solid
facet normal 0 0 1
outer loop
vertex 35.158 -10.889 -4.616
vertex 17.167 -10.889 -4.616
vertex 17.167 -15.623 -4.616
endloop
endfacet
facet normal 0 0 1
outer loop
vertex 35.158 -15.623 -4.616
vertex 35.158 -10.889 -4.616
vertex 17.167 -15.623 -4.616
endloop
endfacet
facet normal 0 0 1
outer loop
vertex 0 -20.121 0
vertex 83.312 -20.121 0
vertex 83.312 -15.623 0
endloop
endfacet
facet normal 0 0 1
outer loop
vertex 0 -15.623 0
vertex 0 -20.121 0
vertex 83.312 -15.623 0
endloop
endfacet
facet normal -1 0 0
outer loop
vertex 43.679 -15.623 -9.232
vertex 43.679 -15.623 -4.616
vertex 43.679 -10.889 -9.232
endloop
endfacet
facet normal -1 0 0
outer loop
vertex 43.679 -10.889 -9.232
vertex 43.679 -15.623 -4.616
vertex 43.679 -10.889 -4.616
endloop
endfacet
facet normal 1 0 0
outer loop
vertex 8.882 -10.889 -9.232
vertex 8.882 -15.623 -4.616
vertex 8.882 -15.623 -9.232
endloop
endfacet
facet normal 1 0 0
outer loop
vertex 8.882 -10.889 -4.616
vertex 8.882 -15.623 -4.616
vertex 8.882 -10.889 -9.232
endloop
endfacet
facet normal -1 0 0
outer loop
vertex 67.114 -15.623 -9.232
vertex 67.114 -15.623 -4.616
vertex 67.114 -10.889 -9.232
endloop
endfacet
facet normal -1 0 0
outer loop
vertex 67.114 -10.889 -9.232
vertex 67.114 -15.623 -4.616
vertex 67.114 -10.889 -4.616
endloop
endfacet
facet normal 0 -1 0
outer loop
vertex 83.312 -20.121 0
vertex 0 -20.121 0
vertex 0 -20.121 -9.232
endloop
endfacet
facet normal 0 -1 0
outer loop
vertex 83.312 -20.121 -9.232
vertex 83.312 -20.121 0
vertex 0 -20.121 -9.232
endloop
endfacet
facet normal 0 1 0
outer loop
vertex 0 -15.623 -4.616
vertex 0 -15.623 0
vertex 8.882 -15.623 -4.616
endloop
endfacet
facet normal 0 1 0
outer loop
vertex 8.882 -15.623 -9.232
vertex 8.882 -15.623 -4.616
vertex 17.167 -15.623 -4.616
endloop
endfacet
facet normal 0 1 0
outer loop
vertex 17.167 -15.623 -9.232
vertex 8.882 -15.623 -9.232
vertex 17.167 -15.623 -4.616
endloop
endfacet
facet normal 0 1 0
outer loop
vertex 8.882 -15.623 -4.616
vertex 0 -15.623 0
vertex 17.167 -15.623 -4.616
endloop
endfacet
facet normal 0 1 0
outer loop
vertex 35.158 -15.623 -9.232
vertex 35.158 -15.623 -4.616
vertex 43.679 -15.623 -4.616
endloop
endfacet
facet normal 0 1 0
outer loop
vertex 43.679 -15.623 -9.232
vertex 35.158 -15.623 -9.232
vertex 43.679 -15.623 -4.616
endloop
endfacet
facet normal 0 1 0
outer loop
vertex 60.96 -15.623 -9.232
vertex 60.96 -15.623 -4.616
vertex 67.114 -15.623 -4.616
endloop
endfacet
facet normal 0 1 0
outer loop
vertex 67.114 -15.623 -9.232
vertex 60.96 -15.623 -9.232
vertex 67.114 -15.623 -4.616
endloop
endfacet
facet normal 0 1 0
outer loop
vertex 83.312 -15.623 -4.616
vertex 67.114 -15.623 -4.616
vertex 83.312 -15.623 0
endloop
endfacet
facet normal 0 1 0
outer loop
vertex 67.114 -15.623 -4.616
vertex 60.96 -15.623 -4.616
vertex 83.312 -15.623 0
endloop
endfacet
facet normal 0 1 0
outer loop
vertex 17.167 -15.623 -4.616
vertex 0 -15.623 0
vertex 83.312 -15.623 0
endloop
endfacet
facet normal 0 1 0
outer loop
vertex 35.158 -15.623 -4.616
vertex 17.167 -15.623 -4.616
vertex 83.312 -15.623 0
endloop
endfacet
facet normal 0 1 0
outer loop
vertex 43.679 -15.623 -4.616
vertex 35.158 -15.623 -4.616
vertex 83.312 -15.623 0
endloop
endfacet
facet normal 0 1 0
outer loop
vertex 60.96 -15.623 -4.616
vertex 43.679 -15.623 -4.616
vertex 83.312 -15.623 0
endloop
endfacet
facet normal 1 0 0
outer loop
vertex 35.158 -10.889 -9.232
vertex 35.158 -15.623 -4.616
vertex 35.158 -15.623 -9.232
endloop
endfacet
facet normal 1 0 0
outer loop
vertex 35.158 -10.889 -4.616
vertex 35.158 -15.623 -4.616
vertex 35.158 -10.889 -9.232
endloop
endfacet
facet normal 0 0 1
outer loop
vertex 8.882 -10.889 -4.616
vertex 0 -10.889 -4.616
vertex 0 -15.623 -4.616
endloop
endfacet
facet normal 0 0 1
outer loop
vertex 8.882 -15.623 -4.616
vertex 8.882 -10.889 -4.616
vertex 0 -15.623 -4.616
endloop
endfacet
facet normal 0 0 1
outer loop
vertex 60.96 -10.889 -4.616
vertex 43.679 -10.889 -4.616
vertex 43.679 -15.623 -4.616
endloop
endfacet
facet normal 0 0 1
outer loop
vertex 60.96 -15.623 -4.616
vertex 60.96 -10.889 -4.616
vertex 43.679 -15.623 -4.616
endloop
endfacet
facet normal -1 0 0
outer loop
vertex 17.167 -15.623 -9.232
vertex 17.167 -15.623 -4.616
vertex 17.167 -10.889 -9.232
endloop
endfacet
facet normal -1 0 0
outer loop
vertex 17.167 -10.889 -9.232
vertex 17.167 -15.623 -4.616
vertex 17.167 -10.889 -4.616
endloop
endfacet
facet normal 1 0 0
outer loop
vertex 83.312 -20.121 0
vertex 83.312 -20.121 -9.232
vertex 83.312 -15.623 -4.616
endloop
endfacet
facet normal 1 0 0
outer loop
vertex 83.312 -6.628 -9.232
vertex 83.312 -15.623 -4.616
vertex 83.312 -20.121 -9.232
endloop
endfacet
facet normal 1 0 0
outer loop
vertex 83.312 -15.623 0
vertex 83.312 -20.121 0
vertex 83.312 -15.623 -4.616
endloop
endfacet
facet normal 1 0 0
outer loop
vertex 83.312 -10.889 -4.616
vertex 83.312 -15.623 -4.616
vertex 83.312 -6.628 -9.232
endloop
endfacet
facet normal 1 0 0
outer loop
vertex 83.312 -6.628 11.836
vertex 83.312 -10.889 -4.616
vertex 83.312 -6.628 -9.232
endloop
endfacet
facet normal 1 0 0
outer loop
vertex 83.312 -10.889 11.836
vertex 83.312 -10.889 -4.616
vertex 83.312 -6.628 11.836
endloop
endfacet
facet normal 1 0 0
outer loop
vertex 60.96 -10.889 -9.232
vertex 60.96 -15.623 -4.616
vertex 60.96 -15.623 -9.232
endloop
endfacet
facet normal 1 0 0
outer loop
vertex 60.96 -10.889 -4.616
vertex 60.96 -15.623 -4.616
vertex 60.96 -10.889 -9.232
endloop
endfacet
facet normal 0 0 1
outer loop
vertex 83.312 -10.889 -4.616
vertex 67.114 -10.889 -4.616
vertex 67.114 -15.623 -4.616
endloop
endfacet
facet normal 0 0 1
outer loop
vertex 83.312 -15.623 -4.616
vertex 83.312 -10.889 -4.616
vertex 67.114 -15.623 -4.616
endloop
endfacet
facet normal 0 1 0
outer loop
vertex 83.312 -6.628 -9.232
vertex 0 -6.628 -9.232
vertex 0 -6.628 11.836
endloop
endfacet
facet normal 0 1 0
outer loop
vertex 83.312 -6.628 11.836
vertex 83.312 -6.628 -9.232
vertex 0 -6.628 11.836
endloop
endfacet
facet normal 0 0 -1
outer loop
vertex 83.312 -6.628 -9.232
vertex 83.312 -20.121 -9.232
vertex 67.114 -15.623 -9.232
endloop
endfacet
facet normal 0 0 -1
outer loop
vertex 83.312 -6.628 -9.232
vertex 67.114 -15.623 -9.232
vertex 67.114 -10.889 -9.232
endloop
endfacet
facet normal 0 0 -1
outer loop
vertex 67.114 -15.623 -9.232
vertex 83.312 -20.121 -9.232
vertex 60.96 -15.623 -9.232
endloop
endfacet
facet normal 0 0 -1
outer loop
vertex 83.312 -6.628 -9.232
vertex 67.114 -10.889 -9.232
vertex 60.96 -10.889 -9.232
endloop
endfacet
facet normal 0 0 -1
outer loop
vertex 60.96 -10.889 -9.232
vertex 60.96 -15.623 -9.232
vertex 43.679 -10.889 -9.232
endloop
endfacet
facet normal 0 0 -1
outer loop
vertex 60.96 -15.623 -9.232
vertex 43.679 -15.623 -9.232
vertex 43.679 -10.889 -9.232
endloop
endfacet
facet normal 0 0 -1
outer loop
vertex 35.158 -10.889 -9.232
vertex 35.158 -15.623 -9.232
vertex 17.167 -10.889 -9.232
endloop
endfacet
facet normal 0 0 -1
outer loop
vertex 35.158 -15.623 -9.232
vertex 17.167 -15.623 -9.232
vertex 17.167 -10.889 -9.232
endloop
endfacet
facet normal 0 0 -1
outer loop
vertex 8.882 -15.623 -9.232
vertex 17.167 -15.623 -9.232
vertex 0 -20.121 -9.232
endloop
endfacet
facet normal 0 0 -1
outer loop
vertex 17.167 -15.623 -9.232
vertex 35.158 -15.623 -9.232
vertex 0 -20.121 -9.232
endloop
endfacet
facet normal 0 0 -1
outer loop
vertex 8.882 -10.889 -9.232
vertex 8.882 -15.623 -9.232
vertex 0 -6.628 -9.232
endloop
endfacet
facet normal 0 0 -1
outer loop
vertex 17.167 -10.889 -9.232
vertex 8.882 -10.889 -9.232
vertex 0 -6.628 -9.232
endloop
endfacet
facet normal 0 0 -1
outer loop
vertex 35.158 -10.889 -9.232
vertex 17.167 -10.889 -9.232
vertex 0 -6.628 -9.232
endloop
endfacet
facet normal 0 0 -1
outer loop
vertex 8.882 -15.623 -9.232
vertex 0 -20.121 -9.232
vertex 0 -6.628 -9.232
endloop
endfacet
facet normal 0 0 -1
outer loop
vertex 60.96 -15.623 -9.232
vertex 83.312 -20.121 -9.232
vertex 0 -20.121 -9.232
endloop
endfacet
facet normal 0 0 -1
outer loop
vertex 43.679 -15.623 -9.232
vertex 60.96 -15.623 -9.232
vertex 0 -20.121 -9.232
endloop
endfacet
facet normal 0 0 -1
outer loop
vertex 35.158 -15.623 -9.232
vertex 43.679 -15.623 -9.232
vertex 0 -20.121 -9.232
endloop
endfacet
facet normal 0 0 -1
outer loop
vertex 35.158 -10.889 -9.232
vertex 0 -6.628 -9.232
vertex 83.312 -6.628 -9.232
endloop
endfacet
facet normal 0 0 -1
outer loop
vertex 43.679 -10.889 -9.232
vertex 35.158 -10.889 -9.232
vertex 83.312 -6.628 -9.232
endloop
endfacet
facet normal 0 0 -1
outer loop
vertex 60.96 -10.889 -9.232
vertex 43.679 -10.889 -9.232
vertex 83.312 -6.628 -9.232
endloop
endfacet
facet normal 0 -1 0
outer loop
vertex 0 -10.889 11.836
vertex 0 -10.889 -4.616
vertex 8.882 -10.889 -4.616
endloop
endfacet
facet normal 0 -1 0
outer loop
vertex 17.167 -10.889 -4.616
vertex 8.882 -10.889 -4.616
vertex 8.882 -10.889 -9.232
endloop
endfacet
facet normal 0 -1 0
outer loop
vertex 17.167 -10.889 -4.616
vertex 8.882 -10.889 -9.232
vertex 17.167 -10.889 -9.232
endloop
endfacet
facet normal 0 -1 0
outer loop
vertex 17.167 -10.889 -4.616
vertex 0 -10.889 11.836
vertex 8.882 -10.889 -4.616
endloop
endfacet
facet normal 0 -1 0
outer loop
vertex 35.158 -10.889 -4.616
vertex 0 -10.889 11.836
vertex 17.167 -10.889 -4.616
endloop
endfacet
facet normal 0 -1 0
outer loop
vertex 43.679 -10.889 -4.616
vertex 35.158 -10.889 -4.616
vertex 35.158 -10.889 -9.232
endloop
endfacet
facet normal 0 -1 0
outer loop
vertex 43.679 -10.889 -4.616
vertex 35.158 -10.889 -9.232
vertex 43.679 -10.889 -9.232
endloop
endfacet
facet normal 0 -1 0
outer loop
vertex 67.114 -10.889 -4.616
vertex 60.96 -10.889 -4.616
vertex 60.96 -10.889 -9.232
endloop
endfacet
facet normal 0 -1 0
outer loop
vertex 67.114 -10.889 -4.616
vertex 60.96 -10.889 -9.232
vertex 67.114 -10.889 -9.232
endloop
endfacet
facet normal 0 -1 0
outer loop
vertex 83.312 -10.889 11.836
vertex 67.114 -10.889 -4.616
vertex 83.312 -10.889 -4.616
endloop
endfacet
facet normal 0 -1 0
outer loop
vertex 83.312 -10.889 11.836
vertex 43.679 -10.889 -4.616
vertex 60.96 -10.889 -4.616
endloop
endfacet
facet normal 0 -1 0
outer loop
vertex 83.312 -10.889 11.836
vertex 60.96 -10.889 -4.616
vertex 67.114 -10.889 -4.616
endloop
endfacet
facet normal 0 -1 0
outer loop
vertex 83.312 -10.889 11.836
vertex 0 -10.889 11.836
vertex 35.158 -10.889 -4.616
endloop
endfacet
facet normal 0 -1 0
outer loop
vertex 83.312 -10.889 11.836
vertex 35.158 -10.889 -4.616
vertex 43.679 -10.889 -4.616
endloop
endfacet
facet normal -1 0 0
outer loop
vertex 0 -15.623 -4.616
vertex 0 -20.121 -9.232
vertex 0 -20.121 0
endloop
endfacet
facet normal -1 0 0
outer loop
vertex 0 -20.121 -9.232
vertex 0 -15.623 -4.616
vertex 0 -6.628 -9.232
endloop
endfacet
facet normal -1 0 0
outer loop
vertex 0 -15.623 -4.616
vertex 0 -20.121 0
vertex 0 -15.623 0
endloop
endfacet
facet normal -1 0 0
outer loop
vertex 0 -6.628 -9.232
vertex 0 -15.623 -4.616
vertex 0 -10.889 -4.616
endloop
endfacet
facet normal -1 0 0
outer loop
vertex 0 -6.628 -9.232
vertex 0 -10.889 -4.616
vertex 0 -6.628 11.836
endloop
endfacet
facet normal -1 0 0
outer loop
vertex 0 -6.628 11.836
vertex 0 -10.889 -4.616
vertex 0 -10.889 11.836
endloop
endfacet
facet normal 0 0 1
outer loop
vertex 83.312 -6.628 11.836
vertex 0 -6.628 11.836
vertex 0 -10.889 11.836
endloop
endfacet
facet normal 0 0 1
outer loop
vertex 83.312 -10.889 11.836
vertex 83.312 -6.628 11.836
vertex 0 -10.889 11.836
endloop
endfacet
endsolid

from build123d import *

# Parameters (mm, degrees)
F0_W     = 4.4976044446
F0_H     = 4.615961574
F0_W_2   = 4.7343205661
F1_DEPTH = 83.312
F2_W     = 8.285057731
F2_H     = 4.7343205661
F2_W_2   = 8.5217729211
F2_W_3   = 6.1546228826
F3_DEPTH = 27.94


with BuildPart() as f1:
    # F0 (on Right) → F1 (new body)
    with BuildSketch(Plane.YZ):
        with Locations((-17.8720569238, -6.923942361)):
            Rectangle(F0_W, F0_H)
        with Locations((-13.2560944185, -6.923942361)):
            Rectangle(F0_W_2, F0_H)
        with Locations((-17.8720569238, -2.307980787)):
            Rectangle(F0_W, F0_H)
        Polygon((-10.8889341354, -4.615961574), (-10.8889341354, -9.231923148), (-6.6280476749, -9.231923148), (-6.6280476749, 11.8357995525), (-10.8889341354, 11.8357995525), align=None)
    extrude(amount=F1_DEPTH)

    # F2 (on face) → F3 (cut)
    with BuildSketch(Plane.XY.offset(-4.615961574)):
        with Locations((13.0246370099, -13.2560944185)):
            Rectangle(F2_W, F2_H)
        with Locations((39.4184701145, -13.2560944185)):
            Rectangle(F2_W_2, F2_H)
        with Locations((64.0369299799, -13.2560944185)):
            Rectangle(F2_W_3, F2_H)
    extrude(amount=-F3_DEPTH, mode=Mode.SUBTRACT)


solid = f1.part
